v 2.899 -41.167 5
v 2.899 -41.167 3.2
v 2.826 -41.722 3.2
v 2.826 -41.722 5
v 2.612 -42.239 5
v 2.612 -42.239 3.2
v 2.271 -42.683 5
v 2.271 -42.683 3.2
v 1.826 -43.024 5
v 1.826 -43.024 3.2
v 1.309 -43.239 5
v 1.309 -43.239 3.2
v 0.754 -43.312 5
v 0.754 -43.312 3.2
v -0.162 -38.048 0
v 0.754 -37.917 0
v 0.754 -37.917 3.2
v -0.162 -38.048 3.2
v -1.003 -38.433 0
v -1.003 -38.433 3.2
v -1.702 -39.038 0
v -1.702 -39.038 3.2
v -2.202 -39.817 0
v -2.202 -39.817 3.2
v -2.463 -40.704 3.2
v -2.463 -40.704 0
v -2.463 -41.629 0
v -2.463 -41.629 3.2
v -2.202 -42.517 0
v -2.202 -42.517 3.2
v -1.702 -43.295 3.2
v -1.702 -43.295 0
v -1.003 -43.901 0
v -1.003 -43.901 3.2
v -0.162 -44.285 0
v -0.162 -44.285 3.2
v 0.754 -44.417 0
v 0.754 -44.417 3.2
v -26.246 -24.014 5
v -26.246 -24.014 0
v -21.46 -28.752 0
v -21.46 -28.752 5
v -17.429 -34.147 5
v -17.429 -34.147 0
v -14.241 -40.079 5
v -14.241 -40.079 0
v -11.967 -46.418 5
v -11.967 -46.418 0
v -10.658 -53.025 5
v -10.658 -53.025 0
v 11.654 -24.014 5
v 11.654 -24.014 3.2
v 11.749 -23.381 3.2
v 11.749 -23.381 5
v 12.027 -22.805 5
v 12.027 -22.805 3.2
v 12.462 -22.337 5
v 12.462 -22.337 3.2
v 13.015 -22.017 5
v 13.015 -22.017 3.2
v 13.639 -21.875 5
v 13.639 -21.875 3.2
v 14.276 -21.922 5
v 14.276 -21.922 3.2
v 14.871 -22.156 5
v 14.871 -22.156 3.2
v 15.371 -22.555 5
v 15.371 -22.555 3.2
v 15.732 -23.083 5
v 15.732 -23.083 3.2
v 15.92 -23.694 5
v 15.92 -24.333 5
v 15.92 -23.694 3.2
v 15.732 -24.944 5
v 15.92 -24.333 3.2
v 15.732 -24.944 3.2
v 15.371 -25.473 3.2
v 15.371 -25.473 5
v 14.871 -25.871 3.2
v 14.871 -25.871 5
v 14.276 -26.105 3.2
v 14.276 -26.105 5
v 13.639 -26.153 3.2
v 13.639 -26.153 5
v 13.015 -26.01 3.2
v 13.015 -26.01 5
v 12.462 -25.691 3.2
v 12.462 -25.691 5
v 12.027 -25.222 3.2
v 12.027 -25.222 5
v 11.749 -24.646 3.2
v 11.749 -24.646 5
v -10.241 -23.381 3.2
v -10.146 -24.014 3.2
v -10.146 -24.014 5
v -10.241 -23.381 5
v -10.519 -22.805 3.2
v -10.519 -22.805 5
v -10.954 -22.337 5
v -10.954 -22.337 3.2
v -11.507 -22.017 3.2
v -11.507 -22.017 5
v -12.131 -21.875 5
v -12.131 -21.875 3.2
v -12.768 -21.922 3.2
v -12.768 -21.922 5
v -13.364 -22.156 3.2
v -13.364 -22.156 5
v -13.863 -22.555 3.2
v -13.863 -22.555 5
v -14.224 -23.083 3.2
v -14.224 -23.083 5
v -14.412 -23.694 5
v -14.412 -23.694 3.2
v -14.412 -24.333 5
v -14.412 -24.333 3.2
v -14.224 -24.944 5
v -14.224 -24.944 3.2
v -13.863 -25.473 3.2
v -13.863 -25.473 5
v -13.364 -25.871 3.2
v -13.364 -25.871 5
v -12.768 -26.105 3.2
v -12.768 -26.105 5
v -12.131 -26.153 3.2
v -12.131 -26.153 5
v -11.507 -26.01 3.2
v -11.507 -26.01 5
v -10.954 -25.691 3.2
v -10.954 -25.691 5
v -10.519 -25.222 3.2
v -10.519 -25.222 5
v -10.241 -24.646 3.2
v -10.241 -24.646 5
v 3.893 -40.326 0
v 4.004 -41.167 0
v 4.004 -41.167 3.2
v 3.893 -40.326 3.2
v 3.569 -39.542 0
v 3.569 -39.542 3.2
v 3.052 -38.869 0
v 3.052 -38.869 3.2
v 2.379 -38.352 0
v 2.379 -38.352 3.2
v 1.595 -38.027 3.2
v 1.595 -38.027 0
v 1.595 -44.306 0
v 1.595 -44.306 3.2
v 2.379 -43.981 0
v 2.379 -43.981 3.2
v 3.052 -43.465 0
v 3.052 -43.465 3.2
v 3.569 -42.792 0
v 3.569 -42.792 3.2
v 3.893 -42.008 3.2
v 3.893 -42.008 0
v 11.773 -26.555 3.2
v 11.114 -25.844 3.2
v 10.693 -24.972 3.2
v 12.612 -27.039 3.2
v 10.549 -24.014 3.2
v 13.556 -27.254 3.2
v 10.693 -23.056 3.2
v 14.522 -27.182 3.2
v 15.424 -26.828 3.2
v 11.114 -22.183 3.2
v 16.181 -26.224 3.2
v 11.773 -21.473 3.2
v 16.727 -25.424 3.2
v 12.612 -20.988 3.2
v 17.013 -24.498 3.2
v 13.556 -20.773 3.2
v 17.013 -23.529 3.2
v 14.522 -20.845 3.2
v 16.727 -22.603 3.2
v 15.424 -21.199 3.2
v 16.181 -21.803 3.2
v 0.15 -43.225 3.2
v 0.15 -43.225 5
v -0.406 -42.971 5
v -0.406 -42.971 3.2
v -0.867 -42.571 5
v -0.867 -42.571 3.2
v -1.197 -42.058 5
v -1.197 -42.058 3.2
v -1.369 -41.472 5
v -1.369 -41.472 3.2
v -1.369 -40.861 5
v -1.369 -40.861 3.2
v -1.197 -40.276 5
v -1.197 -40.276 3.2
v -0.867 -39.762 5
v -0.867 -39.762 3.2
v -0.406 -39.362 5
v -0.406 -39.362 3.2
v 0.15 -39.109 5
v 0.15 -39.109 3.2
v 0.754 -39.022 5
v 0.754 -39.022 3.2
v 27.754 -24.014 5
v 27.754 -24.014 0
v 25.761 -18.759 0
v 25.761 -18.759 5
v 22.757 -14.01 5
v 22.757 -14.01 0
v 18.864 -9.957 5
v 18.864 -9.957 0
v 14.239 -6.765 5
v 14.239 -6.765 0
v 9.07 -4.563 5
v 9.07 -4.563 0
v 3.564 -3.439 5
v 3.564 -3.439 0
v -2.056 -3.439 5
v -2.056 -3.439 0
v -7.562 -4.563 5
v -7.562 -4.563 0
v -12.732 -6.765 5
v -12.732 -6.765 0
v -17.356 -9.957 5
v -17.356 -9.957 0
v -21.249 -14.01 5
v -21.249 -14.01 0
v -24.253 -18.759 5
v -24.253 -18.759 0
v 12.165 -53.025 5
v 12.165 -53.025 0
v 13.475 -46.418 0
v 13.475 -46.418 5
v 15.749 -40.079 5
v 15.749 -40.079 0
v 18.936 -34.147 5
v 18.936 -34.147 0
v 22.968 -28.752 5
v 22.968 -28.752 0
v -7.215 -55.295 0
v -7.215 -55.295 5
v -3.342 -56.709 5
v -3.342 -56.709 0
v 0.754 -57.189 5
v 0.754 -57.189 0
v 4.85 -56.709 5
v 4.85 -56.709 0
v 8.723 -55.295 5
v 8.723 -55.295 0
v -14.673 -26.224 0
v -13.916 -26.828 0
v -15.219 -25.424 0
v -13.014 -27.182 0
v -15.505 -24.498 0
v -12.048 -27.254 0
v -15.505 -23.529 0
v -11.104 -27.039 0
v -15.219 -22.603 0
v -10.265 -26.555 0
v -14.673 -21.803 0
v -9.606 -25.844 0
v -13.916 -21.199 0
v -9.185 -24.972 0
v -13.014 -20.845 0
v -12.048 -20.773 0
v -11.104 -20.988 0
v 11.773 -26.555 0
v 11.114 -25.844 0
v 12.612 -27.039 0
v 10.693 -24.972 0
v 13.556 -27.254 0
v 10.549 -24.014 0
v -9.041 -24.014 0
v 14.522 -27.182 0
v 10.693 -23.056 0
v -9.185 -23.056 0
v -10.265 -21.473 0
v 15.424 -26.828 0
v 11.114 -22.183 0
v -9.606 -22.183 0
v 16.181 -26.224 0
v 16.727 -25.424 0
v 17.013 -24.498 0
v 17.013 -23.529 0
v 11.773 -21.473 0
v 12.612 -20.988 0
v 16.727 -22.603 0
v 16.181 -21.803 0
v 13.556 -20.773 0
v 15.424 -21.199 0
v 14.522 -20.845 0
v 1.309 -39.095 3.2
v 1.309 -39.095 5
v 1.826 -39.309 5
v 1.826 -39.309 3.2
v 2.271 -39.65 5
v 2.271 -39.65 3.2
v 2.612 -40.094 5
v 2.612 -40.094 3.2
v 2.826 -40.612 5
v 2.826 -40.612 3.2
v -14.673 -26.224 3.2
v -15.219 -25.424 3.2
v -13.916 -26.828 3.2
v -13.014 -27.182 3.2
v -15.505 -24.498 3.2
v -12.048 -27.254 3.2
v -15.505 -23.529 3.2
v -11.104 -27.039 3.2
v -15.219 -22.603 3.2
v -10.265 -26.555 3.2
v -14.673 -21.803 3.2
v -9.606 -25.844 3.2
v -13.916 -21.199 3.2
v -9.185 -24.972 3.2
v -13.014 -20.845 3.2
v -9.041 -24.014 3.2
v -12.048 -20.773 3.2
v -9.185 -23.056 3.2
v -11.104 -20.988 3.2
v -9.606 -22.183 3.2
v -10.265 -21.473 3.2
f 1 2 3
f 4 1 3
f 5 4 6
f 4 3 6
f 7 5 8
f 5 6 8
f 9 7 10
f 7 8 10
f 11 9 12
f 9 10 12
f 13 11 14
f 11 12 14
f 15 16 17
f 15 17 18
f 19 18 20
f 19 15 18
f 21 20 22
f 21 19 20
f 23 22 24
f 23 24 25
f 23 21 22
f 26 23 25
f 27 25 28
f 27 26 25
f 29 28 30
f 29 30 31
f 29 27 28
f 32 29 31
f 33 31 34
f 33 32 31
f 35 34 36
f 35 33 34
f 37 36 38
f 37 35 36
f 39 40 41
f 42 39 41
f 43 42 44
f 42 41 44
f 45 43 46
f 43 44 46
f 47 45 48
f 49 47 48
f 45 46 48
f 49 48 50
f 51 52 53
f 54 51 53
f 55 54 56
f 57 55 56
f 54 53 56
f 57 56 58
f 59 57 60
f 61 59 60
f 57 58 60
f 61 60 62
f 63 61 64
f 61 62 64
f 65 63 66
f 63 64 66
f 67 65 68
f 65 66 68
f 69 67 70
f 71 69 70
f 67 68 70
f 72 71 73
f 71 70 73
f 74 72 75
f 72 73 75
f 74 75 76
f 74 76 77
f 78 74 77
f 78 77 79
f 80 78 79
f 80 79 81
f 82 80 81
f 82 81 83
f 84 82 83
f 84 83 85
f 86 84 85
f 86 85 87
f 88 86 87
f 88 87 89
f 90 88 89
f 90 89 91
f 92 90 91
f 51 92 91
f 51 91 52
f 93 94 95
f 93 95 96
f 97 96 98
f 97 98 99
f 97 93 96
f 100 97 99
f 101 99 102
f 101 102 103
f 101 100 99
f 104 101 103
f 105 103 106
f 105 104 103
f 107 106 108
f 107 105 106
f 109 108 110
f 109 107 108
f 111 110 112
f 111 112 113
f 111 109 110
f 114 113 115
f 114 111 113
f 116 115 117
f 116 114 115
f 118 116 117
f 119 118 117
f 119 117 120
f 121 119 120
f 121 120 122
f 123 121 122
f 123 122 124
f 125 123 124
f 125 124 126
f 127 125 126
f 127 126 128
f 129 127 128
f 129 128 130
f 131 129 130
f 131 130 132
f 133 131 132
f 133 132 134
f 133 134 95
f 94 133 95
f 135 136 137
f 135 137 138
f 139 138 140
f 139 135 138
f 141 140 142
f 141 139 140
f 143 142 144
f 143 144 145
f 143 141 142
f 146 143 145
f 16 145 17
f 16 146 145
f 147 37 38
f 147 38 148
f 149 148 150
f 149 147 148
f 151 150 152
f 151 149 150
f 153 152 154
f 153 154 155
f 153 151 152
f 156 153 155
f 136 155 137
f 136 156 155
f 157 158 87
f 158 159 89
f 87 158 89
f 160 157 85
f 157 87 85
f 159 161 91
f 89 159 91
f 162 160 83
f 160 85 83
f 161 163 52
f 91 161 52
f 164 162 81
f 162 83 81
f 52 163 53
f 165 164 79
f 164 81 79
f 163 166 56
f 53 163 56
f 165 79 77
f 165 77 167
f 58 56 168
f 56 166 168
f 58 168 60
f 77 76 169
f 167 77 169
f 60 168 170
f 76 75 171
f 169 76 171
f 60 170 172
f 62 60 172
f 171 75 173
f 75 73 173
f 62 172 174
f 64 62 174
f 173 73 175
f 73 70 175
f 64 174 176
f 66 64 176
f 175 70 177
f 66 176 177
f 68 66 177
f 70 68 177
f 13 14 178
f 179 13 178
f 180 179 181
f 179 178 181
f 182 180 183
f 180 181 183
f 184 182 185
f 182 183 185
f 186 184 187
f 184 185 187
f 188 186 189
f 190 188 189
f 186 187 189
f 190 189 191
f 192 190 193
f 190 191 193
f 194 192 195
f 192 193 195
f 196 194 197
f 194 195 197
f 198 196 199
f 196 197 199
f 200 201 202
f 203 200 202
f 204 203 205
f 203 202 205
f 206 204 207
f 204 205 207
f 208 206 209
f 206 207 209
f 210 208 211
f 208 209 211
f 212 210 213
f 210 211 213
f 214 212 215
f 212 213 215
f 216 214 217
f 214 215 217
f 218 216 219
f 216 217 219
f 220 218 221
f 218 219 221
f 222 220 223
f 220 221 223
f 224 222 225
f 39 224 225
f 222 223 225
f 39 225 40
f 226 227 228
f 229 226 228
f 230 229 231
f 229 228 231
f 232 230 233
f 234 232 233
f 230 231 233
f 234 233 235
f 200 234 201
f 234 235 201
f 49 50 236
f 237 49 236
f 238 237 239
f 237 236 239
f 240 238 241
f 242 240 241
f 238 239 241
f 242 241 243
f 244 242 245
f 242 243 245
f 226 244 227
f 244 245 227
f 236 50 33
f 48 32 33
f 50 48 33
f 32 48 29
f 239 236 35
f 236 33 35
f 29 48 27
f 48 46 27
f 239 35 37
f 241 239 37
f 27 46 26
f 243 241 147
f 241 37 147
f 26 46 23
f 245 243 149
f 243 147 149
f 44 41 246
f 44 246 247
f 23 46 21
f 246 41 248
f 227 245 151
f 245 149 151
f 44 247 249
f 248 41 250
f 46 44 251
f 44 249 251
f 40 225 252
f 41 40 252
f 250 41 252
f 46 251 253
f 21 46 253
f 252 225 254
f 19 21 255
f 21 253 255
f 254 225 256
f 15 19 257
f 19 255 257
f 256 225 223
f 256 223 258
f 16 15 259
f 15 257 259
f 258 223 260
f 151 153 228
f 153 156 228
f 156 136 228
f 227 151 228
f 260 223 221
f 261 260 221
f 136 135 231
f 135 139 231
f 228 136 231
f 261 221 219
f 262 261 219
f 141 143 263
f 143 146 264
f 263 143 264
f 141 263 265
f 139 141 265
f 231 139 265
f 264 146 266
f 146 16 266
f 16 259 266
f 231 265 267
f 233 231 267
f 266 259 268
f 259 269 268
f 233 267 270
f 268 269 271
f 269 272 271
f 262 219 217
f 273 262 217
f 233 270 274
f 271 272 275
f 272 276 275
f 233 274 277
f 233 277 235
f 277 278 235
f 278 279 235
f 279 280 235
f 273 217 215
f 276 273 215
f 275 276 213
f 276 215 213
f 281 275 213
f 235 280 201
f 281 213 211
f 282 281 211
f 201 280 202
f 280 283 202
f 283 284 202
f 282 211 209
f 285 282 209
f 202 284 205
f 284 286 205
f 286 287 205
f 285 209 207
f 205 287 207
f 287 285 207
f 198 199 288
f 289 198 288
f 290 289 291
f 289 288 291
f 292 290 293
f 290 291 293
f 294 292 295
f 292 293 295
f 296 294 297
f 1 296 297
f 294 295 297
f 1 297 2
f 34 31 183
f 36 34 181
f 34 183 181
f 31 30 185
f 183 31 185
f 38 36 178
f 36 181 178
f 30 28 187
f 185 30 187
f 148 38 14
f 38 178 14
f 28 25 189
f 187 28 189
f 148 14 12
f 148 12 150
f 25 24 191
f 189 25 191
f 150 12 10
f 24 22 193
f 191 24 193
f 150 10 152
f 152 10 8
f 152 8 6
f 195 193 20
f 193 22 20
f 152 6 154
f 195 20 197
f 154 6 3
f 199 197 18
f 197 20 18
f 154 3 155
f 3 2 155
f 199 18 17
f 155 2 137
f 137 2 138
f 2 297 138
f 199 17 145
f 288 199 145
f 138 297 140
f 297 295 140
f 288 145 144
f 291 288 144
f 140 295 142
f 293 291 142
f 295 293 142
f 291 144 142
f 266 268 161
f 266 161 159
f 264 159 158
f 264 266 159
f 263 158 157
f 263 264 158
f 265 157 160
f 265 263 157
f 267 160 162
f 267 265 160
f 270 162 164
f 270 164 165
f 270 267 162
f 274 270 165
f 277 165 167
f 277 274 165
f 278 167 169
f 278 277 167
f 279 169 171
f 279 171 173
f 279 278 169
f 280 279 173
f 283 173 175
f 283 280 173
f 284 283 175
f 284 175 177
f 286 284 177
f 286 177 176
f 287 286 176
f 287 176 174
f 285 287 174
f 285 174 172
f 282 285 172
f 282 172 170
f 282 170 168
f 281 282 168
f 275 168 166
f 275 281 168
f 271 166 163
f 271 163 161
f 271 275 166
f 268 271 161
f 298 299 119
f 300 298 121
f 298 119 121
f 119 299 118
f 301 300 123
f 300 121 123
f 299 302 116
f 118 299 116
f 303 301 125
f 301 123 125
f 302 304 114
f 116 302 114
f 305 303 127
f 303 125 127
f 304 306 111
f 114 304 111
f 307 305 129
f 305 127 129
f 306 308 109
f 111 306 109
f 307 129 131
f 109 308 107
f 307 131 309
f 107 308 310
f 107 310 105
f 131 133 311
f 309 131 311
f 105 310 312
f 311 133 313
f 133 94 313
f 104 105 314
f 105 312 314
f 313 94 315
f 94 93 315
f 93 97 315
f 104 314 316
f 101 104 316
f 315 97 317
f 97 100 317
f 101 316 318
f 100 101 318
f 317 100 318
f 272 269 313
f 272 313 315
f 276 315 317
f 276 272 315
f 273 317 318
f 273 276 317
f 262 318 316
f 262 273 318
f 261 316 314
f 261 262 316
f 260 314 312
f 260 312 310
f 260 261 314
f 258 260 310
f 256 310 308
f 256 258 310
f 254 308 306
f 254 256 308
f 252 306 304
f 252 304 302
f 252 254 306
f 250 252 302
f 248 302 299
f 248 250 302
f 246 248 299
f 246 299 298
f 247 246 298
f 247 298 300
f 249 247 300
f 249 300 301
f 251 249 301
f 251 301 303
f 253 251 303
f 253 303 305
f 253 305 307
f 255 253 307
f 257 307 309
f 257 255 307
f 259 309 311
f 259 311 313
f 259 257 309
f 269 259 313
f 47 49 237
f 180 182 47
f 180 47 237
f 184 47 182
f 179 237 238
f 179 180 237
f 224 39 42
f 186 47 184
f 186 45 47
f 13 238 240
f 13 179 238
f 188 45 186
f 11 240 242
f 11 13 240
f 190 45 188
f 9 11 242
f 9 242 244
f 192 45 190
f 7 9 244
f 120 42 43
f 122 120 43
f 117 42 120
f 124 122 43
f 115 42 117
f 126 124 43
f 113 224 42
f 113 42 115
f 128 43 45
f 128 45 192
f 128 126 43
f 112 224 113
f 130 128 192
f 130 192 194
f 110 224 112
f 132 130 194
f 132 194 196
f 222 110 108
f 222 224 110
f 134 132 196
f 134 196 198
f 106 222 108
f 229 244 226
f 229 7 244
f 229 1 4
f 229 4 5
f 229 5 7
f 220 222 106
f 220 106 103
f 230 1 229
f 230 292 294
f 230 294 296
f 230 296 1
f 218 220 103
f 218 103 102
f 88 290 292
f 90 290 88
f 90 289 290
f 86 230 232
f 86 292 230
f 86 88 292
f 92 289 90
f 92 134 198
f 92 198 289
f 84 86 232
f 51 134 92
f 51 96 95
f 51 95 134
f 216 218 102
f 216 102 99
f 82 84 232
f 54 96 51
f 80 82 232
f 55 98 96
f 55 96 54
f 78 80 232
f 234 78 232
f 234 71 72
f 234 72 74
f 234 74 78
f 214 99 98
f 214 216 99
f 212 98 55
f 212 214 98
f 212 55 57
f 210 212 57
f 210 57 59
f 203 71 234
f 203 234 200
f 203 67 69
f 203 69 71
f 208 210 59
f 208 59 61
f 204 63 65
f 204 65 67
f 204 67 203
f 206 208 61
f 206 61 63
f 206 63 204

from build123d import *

# Parameters (mm, degrees)
F0_R     = 4
F0_R_2   = 3.25
F0_R_3   = 2.145
F1_DEPTH = 5
F2_DEPTH = 3.2


with BuildPart() as f1:
    # F0 (on Top) → F1 (new body)
    with BuildSketch(Plane.XY):
        with BuildLine():
            ThreePointArc((-10.6575777754, -53.0245751143), (-5.3198116886, -56.1150509582), (0.7539304934, -57.1885702394))
            ThreePointArc((0.7539304934, -57.1885702394), (6.8276726753, -56.1150509582), (12.1654387622, -53.0245751143))
            ThreePointArc((12.1654387622, -53.0245751143), (17.232310235, -37.0535716462), (27.7539304934, -24.013569904))
            ThreePointArc((27.7539304934, -24.013569904), (0.7539304934, -3.2972529395), (-26.2460695066, -24.013569904))
            ThreePointArc((-26.2460695066, -24.013569904), (-15.7244492482, -37.0535716462), (-10.6575777754, -53.0245751143))
        make_face()
        with BuildLine():
            ThreePointArc((4.7539304934, -41.1667175744), (3.5823576181, -43.9951446991), (0.7539304934, -45.1667175744))
            ThreePointArc((0.7539304934, -45.1667175744), (-3.2460695066, -41.1667175744), (0.7539304934, -37.1667175744))
            ThreePointArc((0.7539304934, -37.1667175744), (3.5823576181, -38.3382904496), (4.7539304934, -41.1667175744))
        make_face(mode=Mode.SUBTRACT)
        with Locations((-12.2910695066, -24.013569904)):
            Circle(F0_R, mode=Mode.SUBTRACT)
        with BuildLine():
            ThreePointArc((17.7989304934, -24.013569904), (13.7989304934, -28.013569904), (9.7989304934, -24.013569904))
            ThreePointArc((9.7989304934, -24.013569904), (13.7989304934, -20.013569904), (17.7989304934, -24.013569904))
        make_face(mode=Mode.SUBTRACT)
        with BuildLine():
            ThreePointArc((17.7989304934, -24.013569904), (13.7989304934, -20.013569904), (9.7989304934, -24.013569904))
            ThreePointArc((9.7989304934, -24.013569904), (13.7989304934, -28.013569904), (17.7989304934, -24.013569904))
        make_face()
        with BuildLine():
            ThreePointArc((17.0489304934, -24.013569904), (13.7989304934, -27.263569904), (10.5489304934, -24.013569904))
            ThreePointArc((10.5489304934, -24.013569904), (13.7989304934, -20.763569904), (17.0489304934, -24.013569904))
        make_face(mode=Mode.SUBTRACT)
        with Locations((-12.2910695066, -24.013569904)):
            Circle(F0_R)
        with Locations((-12.2910695066, -24.013569904)):
            Circle(F0_R_2, mode=Mode.SUBTRACT)
        with BuildLine():
            ThreePointArc((17.0489304934, -24.013569904), (13.7989304934, -20.763569904), (10.5489304934, -24.013569904))
            ThreePointArc((10.5489304934, -24.013569904), (13.7989304934, -27.263569904), (17.0489304934, -24.013569904))
        make_face()
        with BuildLine():
            ThreePointArc((15.9439304934, -24.013569904), (13.7989304934, -26.158569904), (11.6539304934, -24.013569904))
            ThreePointArc((11.6539304934, -24.013569904), (13.7989304934, -21.868569904), (15.9439304934, -24.013569904))
        make_face(mode=Mode.SUBTRACT)
        with Locations((-12.2910695066, -24.013569904)):
            Circle(F0_R_2)
        with Locations((-12.2910695066, -24.013569904)):
            Circle(F0_R_3, mode=Mode.SUBTRACT)
        with BuildLine():
            ThreePointArc((0.7539304934, -37.9167175744), (-2.4960695066, -41.1667175744), (0.7539304934, -44.4167175744))
            Line((0.7539304934, -44.4167175744), (0.7539304934, -43.3117175744))
            ThreePointArc((0.7539304934, -43.3117175744), (-1.3910695066, -41.1667175744), (0.7539304934, -39.0217175744))
            Line((0.7539304934, -39.0217175744), (0.7539304934, -37.9167175744))
        make_face()
        with BuildLine():
            Line((0.7539304934, -43.3117175744), (0.7539304934, -44.4167175744))
            ThreePointArc((0.7539304934, -44.4167175744), (3.0520275322, -43.4648146132), (4.0039304934, -41.1667175744))
            ThreePointArc((4.0039304934, -41.1667175744), (3.0520275322, -38.8686205355), (0.7539304934, -37.9167175744))
            Line((0.7539304934, -37.9167175744), (0.7539304934, -39.0217175744))
            ThreePointArc((0.7539304934, -39.0217175744), (2.270674539, -39.6499735287), (2.8989304934, -41.1667175744))
            ThreePointArc((2.8989304934, -41.1667175744), (2.270674539, -42.68346162), (0.7539304934, -43.3117175744))
        make_face()
        with BuildLine():
            ThreePointArc((0.7539304934, -37.1667175744), (-3.2460695066, -41.1667175744), (0.7539304934, -45.1667175744))
            Line((0.7539304934, -45.1667175744), (0.7539304934, -44.4167175744))
            ThreePointArc((0.7539304934, -44.4167175744), (-2.4960695066, -41.1667175744), (0.7539304934, -37.9167175744))
            Line((0.7539304934, -37.9167175744), (0.7539304934, -37.1667175744))
        make_face()
        with BuildLine():
            Line((0.7539304934, -44.4167175744), (0.7539304934, -45.1667175744))
            ThreePointArc((0.7539304934, -45.1667175744), (3.5823576181, -43.9951446991), (4.7539304934, -41.1667175744))
            ThreePointArc((4.7539304934, -41.1667175744), (3.5823576181, -38.3382904496), (0.7539304934, -37.1667175744))
            Line((0.7539304934, -37.1667175744), (0.7539304934, -37.9167175744))
            ThreePointArc((0.7539304934, -37.9167175744), (3.0520275322, -38.8686205355), (4.0039304934, -41.1667175744))
            ThreePointArc((4.0039304934, -41.1667175744), (3.0520275322, -43.4648146132), (0.7539304934, -44.4167175744))
        make_face()
    extrude(amount=F1_DEPTH)

    # F0 (on Top) → F2 (cut)
    with BuildSketch(Plane.XY):
        with BuildLine():
            ThreePointArc((17.0489304934, -24.013569904), (13.7989304934, -20.763569904), (10.5489304934, -24.013569904))
            ThreePointArc((10.5489304934, -24.013569904), (13.7989304934, -27.263569904), (17.0489304934, -24.013569904))
        make_face()
        with BuildLine():
            ThreePointArc((15.9439304934, -24.013569904), (13.7989304934, -26.158569904), (11.6539304934, -24.013569904))
            ThreePointArc((11.6539304934, -24.013569904), (13.7989304934, -21.868569904), (15.9439304934, -24.013569904))
        make_face(mode=Mode.SUBTRACT)
        with Locations((-12.2910695066, -24.013569904)):
            Circle(F0_R_2)
        with Locations((-12.2910695066, -24.013569904)):
            Circle(F0_R_3, mode=Mode.SUBTRACT)
        with BuildLine():
            ThreePointArc((0.7539304934, -37.9167175744), (-2.4960695066, -41.1667175744), (0.7539304934, -44.4167175744))
            Line((0.7539304934, -44.4167175744), (0.7539304934, -43.3117175744))
            ThreePointArc((0.7539304934, -43.3117175744), (-1.3910695066, -41.1667175744), (0.7539304934, -39.0217175744))
            Line((0.7539304934, -39.0217175744), (0.7539304934, -37.9167175744))
        make_face()
        with BuildLine():
            Line((0.7539304934, -43.3117175744), (0.7539304934, -44.4167175744))
            ThreePointArc((0.7539304934, -44.4167175744), (3.0520275322, -43.4648146132), (4.0039304934, -41.1667175744))
            ThreePointArc((4.0039304934, -41.1667175744), (3.0520275322, -38.8686205355), (0.7539304934, -37.9167175744))
            Line((0.7539304934, -37.9167175744), (0.7539304934, -39.0217175744))
            ThreePointArc((0.7539304934, -39.0217175744), (2.270674539, -39.6499735287), (2.8989304934, -41.1667175744))
            ThreePointArc((2.8989304934, -41.1667175744), (2.270674539, -42.68346162), (0.7539304934, -43.3117175744))
        make_face()
    extrude(amount=F2_DEPTH, mode=Mode.SUBTRACT)


solid = f1.part
